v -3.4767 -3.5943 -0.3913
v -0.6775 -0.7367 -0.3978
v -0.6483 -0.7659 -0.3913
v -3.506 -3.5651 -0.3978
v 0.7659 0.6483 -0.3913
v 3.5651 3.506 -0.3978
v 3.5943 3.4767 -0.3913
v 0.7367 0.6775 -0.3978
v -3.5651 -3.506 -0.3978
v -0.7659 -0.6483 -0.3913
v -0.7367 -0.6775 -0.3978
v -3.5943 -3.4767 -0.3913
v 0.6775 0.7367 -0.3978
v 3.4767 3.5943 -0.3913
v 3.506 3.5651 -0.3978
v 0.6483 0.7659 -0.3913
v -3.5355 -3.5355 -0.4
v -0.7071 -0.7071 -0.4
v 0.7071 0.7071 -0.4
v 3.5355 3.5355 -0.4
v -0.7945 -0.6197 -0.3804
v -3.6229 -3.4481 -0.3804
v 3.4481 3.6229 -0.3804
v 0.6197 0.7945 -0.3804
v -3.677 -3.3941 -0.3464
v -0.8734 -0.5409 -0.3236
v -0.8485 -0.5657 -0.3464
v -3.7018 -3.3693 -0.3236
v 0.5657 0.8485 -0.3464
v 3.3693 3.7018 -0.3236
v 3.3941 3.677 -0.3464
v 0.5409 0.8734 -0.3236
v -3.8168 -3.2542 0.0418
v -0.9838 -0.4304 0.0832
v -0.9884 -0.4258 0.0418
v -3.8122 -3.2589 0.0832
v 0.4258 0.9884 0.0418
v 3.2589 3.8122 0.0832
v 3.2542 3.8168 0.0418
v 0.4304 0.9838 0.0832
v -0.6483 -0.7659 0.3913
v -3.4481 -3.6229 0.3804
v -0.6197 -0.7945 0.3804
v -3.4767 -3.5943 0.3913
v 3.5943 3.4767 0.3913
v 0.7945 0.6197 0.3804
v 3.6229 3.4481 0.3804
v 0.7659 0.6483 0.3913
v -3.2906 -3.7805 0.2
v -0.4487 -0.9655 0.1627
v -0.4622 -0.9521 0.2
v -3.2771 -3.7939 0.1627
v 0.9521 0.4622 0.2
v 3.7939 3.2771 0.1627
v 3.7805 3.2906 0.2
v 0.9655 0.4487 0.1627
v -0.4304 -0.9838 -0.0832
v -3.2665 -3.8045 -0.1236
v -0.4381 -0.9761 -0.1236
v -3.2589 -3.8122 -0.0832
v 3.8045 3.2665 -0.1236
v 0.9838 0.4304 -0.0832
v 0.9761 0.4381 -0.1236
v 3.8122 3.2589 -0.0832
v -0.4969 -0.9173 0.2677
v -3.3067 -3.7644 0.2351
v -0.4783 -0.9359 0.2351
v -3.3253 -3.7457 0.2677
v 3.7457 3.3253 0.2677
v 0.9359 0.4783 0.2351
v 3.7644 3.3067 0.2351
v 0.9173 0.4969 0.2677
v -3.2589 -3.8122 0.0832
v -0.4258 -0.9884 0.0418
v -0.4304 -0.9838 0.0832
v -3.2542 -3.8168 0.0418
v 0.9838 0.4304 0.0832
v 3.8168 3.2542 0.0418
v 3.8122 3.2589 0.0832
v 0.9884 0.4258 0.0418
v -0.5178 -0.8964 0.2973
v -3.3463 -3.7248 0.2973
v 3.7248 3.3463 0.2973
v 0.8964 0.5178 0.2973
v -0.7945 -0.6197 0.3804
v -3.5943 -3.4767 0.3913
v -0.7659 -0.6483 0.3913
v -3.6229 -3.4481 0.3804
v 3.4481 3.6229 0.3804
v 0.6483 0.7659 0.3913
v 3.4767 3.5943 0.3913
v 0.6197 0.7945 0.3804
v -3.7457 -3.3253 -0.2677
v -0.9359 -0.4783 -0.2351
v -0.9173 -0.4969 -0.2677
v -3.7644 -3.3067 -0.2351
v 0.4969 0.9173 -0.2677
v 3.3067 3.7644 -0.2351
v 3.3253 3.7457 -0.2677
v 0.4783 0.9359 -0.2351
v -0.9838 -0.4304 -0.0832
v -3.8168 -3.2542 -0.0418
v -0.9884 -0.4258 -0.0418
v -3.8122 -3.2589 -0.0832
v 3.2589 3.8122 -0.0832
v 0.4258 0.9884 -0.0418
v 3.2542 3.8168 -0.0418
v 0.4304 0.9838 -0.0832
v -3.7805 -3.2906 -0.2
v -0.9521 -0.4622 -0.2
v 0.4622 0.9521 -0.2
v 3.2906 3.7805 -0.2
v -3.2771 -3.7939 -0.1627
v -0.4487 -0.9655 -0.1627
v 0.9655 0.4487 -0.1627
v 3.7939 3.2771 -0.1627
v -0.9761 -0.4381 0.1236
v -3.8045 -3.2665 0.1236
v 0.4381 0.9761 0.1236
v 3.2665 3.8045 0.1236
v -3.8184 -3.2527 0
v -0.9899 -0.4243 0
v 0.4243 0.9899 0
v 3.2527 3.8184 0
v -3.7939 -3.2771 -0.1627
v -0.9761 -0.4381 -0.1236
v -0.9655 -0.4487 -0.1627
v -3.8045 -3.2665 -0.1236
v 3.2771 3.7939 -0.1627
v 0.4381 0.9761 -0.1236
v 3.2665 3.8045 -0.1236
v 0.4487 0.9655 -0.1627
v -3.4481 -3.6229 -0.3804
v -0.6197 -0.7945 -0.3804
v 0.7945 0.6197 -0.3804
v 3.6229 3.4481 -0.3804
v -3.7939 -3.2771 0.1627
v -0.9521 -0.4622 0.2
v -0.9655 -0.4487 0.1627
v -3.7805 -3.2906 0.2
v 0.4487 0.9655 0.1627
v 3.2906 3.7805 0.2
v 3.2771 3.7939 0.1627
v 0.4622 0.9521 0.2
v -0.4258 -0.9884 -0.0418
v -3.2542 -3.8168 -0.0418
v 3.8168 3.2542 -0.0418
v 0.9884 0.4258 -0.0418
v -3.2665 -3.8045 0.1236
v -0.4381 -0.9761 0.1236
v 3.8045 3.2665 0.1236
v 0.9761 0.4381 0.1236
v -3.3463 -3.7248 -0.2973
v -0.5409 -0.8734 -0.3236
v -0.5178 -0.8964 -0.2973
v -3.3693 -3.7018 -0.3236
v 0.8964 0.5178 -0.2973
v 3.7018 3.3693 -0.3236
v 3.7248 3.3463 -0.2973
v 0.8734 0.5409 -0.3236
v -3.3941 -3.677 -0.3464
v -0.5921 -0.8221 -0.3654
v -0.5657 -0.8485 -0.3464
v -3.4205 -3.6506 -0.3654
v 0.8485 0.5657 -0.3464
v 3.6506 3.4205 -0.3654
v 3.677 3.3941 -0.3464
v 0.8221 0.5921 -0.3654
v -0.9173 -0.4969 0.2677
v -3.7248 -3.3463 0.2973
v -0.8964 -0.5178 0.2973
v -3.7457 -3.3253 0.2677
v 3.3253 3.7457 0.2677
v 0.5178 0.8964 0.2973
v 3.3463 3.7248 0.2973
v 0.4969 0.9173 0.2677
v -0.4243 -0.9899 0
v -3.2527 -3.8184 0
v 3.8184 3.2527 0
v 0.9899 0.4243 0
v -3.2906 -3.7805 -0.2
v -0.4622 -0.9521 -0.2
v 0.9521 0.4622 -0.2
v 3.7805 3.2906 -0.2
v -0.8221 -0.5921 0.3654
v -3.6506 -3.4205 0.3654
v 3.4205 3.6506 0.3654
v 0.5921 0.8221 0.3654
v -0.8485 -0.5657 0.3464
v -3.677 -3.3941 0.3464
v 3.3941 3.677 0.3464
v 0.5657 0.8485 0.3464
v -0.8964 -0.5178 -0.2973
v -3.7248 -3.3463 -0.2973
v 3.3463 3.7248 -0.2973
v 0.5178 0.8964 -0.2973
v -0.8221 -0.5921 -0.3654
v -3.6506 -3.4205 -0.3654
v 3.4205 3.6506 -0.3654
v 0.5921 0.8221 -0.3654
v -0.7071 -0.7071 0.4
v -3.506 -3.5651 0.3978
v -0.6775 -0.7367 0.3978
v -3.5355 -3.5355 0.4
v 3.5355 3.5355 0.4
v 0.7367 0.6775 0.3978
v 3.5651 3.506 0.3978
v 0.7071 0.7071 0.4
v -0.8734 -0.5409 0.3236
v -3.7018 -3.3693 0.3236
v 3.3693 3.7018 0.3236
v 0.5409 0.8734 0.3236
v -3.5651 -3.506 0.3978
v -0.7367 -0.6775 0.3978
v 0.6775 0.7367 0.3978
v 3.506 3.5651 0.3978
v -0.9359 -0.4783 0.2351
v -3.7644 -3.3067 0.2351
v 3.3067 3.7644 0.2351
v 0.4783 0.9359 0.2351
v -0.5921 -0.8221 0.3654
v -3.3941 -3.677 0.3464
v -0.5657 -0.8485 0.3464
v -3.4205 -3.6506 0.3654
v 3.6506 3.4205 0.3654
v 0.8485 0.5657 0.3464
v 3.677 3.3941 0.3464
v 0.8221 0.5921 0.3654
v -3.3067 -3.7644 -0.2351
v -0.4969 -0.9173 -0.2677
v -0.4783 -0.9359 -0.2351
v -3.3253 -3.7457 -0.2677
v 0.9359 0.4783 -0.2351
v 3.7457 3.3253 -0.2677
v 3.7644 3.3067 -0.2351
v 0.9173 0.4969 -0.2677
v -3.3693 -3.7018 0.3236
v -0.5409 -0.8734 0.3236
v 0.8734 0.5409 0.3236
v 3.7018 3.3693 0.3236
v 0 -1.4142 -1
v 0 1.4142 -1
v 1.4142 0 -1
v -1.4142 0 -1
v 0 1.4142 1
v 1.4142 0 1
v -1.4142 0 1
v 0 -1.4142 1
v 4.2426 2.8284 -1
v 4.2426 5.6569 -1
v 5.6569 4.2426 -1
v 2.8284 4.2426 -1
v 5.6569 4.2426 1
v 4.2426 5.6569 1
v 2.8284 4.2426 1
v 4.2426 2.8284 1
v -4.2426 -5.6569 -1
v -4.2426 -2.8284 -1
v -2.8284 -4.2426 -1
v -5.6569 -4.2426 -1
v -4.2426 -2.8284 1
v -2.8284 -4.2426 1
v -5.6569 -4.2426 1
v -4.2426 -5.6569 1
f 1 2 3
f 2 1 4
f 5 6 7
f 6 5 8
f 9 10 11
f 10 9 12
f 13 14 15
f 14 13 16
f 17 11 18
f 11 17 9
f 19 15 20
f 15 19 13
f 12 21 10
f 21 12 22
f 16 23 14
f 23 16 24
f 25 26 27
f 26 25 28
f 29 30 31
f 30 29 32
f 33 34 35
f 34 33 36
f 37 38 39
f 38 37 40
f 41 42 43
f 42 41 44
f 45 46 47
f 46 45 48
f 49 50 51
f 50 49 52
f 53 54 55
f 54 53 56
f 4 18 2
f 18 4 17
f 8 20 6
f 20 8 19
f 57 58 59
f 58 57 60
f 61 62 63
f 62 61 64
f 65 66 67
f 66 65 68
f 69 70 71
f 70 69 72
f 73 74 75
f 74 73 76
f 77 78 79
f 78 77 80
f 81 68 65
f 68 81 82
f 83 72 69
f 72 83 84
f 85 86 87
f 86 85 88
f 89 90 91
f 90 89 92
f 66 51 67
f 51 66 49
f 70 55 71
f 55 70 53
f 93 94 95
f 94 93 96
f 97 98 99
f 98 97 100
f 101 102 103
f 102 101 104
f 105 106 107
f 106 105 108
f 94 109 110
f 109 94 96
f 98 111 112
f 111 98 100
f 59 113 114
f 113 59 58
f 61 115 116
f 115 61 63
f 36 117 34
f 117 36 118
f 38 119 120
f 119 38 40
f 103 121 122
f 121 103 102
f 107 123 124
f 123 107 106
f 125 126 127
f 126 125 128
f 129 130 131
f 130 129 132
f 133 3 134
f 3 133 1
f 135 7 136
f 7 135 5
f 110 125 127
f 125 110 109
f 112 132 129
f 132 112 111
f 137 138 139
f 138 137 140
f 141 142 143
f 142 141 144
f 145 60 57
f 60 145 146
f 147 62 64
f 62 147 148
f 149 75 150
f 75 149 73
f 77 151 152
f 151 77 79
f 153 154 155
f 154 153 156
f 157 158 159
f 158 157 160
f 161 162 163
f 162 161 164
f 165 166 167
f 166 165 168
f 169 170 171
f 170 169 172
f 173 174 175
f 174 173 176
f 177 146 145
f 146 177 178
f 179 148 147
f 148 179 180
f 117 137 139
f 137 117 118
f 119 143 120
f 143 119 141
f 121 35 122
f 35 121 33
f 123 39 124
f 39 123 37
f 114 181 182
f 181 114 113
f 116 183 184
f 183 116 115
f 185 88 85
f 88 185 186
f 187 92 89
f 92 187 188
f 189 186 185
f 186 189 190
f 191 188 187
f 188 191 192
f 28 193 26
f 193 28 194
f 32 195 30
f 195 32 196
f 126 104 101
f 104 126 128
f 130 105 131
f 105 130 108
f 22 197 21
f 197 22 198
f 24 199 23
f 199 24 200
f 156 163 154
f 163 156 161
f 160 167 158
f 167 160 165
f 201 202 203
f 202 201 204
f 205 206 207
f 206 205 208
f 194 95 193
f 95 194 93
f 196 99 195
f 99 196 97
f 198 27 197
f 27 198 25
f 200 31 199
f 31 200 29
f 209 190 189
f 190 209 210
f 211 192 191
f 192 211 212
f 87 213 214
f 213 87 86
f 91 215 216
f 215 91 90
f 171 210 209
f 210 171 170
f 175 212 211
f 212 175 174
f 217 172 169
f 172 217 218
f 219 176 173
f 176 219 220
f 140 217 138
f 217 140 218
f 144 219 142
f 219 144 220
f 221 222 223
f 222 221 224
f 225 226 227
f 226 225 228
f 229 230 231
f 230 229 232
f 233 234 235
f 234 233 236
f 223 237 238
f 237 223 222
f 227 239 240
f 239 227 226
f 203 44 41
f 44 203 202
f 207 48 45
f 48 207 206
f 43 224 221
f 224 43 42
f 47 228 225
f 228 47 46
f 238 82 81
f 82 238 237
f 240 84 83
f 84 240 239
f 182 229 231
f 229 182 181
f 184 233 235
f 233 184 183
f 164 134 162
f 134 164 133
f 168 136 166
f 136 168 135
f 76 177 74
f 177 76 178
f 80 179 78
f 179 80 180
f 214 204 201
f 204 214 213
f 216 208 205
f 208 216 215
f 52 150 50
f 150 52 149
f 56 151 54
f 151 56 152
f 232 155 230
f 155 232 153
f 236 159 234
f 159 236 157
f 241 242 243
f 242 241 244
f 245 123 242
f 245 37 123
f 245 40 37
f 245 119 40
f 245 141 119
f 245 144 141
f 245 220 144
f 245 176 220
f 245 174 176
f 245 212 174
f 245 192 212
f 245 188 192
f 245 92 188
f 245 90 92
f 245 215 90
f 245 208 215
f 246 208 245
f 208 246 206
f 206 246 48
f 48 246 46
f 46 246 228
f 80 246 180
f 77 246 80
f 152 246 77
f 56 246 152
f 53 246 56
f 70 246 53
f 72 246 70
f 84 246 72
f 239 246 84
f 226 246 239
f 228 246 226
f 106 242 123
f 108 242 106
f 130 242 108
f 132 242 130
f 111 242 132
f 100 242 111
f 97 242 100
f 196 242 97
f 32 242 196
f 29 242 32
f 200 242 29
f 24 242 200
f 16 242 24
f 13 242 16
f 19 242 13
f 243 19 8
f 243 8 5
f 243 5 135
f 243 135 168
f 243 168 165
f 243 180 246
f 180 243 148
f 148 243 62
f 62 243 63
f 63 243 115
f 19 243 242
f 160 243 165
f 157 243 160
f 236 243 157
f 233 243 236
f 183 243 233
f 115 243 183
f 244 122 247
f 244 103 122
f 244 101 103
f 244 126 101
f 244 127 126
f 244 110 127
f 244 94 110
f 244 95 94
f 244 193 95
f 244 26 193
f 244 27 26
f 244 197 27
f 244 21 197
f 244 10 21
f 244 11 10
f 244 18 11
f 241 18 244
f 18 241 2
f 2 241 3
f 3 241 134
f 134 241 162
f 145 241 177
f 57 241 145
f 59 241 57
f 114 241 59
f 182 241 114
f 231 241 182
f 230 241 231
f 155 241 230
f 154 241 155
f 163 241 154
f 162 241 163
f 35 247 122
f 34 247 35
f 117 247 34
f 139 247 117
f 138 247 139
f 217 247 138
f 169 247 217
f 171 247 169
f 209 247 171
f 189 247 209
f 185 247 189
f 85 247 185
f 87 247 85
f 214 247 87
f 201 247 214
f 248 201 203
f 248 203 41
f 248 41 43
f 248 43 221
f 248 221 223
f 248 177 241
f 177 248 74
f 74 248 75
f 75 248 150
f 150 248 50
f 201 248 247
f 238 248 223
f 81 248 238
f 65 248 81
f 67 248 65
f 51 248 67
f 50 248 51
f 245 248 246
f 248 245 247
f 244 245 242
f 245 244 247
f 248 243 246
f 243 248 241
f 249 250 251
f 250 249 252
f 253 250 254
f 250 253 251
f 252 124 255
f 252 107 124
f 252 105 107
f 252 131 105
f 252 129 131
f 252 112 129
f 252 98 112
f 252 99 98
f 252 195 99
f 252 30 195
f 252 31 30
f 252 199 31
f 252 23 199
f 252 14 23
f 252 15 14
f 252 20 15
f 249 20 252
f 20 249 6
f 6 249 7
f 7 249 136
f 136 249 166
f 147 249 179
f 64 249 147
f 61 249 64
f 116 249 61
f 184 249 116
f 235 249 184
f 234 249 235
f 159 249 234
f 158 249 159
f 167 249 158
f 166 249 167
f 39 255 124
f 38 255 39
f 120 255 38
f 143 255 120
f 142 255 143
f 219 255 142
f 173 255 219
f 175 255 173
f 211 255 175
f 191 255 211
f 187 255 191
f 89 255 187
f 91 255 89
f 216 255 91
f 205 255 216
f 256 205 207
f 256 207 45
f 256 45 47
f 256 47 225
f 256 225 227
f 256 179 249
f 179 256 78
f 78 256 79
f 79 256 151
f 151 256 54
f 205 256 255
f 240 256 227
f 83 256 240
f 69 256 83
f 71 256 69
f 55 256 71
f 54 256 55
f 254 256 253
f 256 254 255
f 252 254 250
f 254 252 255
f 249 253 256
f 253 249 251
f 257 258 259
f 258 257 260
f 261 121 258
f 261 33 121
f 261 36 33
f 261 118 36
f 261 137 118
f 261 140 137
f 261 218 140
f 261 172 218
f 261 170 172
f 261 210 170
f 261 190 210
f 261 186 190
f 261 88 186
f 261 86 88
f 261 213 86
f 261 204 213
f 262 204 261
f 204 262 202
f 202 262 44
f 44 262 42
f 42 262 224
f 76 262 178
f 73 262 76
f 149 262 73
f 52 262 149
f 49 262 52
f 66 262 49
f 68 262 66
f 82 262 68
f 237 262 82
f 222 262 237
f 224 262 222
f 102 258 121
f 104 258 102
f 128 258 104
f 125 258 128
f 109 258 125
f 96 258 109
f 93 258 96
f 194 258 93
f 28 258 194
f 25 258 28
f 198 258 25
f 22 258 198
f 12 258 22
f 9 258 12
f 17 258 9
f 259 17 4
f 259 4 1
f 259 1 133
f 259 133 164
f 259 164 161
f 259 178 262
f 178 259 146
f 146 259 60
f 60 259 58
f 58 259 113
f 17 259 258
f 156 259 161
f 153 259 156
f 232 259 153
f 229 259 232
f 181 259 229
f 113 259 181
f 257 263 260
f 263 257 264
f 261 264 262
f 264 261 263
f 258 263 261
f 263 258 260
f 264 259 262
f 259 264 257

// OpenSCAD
module LinearLayoutIcon() {
  kL = 12;
  module Cube_() { cube([2, 2, 2], center = true); }

  cylinder(r  = .4, h = kL, center = true);
  translate([0, 0,  0])      Cube_();
  translate([0, 0,  kL / 2]) Cube_();
  translate([0, 0, -kL / 2]) Cube_();
}

rotate([-45, 90, 0]) LinearLayoutIcon($fn = 60);
